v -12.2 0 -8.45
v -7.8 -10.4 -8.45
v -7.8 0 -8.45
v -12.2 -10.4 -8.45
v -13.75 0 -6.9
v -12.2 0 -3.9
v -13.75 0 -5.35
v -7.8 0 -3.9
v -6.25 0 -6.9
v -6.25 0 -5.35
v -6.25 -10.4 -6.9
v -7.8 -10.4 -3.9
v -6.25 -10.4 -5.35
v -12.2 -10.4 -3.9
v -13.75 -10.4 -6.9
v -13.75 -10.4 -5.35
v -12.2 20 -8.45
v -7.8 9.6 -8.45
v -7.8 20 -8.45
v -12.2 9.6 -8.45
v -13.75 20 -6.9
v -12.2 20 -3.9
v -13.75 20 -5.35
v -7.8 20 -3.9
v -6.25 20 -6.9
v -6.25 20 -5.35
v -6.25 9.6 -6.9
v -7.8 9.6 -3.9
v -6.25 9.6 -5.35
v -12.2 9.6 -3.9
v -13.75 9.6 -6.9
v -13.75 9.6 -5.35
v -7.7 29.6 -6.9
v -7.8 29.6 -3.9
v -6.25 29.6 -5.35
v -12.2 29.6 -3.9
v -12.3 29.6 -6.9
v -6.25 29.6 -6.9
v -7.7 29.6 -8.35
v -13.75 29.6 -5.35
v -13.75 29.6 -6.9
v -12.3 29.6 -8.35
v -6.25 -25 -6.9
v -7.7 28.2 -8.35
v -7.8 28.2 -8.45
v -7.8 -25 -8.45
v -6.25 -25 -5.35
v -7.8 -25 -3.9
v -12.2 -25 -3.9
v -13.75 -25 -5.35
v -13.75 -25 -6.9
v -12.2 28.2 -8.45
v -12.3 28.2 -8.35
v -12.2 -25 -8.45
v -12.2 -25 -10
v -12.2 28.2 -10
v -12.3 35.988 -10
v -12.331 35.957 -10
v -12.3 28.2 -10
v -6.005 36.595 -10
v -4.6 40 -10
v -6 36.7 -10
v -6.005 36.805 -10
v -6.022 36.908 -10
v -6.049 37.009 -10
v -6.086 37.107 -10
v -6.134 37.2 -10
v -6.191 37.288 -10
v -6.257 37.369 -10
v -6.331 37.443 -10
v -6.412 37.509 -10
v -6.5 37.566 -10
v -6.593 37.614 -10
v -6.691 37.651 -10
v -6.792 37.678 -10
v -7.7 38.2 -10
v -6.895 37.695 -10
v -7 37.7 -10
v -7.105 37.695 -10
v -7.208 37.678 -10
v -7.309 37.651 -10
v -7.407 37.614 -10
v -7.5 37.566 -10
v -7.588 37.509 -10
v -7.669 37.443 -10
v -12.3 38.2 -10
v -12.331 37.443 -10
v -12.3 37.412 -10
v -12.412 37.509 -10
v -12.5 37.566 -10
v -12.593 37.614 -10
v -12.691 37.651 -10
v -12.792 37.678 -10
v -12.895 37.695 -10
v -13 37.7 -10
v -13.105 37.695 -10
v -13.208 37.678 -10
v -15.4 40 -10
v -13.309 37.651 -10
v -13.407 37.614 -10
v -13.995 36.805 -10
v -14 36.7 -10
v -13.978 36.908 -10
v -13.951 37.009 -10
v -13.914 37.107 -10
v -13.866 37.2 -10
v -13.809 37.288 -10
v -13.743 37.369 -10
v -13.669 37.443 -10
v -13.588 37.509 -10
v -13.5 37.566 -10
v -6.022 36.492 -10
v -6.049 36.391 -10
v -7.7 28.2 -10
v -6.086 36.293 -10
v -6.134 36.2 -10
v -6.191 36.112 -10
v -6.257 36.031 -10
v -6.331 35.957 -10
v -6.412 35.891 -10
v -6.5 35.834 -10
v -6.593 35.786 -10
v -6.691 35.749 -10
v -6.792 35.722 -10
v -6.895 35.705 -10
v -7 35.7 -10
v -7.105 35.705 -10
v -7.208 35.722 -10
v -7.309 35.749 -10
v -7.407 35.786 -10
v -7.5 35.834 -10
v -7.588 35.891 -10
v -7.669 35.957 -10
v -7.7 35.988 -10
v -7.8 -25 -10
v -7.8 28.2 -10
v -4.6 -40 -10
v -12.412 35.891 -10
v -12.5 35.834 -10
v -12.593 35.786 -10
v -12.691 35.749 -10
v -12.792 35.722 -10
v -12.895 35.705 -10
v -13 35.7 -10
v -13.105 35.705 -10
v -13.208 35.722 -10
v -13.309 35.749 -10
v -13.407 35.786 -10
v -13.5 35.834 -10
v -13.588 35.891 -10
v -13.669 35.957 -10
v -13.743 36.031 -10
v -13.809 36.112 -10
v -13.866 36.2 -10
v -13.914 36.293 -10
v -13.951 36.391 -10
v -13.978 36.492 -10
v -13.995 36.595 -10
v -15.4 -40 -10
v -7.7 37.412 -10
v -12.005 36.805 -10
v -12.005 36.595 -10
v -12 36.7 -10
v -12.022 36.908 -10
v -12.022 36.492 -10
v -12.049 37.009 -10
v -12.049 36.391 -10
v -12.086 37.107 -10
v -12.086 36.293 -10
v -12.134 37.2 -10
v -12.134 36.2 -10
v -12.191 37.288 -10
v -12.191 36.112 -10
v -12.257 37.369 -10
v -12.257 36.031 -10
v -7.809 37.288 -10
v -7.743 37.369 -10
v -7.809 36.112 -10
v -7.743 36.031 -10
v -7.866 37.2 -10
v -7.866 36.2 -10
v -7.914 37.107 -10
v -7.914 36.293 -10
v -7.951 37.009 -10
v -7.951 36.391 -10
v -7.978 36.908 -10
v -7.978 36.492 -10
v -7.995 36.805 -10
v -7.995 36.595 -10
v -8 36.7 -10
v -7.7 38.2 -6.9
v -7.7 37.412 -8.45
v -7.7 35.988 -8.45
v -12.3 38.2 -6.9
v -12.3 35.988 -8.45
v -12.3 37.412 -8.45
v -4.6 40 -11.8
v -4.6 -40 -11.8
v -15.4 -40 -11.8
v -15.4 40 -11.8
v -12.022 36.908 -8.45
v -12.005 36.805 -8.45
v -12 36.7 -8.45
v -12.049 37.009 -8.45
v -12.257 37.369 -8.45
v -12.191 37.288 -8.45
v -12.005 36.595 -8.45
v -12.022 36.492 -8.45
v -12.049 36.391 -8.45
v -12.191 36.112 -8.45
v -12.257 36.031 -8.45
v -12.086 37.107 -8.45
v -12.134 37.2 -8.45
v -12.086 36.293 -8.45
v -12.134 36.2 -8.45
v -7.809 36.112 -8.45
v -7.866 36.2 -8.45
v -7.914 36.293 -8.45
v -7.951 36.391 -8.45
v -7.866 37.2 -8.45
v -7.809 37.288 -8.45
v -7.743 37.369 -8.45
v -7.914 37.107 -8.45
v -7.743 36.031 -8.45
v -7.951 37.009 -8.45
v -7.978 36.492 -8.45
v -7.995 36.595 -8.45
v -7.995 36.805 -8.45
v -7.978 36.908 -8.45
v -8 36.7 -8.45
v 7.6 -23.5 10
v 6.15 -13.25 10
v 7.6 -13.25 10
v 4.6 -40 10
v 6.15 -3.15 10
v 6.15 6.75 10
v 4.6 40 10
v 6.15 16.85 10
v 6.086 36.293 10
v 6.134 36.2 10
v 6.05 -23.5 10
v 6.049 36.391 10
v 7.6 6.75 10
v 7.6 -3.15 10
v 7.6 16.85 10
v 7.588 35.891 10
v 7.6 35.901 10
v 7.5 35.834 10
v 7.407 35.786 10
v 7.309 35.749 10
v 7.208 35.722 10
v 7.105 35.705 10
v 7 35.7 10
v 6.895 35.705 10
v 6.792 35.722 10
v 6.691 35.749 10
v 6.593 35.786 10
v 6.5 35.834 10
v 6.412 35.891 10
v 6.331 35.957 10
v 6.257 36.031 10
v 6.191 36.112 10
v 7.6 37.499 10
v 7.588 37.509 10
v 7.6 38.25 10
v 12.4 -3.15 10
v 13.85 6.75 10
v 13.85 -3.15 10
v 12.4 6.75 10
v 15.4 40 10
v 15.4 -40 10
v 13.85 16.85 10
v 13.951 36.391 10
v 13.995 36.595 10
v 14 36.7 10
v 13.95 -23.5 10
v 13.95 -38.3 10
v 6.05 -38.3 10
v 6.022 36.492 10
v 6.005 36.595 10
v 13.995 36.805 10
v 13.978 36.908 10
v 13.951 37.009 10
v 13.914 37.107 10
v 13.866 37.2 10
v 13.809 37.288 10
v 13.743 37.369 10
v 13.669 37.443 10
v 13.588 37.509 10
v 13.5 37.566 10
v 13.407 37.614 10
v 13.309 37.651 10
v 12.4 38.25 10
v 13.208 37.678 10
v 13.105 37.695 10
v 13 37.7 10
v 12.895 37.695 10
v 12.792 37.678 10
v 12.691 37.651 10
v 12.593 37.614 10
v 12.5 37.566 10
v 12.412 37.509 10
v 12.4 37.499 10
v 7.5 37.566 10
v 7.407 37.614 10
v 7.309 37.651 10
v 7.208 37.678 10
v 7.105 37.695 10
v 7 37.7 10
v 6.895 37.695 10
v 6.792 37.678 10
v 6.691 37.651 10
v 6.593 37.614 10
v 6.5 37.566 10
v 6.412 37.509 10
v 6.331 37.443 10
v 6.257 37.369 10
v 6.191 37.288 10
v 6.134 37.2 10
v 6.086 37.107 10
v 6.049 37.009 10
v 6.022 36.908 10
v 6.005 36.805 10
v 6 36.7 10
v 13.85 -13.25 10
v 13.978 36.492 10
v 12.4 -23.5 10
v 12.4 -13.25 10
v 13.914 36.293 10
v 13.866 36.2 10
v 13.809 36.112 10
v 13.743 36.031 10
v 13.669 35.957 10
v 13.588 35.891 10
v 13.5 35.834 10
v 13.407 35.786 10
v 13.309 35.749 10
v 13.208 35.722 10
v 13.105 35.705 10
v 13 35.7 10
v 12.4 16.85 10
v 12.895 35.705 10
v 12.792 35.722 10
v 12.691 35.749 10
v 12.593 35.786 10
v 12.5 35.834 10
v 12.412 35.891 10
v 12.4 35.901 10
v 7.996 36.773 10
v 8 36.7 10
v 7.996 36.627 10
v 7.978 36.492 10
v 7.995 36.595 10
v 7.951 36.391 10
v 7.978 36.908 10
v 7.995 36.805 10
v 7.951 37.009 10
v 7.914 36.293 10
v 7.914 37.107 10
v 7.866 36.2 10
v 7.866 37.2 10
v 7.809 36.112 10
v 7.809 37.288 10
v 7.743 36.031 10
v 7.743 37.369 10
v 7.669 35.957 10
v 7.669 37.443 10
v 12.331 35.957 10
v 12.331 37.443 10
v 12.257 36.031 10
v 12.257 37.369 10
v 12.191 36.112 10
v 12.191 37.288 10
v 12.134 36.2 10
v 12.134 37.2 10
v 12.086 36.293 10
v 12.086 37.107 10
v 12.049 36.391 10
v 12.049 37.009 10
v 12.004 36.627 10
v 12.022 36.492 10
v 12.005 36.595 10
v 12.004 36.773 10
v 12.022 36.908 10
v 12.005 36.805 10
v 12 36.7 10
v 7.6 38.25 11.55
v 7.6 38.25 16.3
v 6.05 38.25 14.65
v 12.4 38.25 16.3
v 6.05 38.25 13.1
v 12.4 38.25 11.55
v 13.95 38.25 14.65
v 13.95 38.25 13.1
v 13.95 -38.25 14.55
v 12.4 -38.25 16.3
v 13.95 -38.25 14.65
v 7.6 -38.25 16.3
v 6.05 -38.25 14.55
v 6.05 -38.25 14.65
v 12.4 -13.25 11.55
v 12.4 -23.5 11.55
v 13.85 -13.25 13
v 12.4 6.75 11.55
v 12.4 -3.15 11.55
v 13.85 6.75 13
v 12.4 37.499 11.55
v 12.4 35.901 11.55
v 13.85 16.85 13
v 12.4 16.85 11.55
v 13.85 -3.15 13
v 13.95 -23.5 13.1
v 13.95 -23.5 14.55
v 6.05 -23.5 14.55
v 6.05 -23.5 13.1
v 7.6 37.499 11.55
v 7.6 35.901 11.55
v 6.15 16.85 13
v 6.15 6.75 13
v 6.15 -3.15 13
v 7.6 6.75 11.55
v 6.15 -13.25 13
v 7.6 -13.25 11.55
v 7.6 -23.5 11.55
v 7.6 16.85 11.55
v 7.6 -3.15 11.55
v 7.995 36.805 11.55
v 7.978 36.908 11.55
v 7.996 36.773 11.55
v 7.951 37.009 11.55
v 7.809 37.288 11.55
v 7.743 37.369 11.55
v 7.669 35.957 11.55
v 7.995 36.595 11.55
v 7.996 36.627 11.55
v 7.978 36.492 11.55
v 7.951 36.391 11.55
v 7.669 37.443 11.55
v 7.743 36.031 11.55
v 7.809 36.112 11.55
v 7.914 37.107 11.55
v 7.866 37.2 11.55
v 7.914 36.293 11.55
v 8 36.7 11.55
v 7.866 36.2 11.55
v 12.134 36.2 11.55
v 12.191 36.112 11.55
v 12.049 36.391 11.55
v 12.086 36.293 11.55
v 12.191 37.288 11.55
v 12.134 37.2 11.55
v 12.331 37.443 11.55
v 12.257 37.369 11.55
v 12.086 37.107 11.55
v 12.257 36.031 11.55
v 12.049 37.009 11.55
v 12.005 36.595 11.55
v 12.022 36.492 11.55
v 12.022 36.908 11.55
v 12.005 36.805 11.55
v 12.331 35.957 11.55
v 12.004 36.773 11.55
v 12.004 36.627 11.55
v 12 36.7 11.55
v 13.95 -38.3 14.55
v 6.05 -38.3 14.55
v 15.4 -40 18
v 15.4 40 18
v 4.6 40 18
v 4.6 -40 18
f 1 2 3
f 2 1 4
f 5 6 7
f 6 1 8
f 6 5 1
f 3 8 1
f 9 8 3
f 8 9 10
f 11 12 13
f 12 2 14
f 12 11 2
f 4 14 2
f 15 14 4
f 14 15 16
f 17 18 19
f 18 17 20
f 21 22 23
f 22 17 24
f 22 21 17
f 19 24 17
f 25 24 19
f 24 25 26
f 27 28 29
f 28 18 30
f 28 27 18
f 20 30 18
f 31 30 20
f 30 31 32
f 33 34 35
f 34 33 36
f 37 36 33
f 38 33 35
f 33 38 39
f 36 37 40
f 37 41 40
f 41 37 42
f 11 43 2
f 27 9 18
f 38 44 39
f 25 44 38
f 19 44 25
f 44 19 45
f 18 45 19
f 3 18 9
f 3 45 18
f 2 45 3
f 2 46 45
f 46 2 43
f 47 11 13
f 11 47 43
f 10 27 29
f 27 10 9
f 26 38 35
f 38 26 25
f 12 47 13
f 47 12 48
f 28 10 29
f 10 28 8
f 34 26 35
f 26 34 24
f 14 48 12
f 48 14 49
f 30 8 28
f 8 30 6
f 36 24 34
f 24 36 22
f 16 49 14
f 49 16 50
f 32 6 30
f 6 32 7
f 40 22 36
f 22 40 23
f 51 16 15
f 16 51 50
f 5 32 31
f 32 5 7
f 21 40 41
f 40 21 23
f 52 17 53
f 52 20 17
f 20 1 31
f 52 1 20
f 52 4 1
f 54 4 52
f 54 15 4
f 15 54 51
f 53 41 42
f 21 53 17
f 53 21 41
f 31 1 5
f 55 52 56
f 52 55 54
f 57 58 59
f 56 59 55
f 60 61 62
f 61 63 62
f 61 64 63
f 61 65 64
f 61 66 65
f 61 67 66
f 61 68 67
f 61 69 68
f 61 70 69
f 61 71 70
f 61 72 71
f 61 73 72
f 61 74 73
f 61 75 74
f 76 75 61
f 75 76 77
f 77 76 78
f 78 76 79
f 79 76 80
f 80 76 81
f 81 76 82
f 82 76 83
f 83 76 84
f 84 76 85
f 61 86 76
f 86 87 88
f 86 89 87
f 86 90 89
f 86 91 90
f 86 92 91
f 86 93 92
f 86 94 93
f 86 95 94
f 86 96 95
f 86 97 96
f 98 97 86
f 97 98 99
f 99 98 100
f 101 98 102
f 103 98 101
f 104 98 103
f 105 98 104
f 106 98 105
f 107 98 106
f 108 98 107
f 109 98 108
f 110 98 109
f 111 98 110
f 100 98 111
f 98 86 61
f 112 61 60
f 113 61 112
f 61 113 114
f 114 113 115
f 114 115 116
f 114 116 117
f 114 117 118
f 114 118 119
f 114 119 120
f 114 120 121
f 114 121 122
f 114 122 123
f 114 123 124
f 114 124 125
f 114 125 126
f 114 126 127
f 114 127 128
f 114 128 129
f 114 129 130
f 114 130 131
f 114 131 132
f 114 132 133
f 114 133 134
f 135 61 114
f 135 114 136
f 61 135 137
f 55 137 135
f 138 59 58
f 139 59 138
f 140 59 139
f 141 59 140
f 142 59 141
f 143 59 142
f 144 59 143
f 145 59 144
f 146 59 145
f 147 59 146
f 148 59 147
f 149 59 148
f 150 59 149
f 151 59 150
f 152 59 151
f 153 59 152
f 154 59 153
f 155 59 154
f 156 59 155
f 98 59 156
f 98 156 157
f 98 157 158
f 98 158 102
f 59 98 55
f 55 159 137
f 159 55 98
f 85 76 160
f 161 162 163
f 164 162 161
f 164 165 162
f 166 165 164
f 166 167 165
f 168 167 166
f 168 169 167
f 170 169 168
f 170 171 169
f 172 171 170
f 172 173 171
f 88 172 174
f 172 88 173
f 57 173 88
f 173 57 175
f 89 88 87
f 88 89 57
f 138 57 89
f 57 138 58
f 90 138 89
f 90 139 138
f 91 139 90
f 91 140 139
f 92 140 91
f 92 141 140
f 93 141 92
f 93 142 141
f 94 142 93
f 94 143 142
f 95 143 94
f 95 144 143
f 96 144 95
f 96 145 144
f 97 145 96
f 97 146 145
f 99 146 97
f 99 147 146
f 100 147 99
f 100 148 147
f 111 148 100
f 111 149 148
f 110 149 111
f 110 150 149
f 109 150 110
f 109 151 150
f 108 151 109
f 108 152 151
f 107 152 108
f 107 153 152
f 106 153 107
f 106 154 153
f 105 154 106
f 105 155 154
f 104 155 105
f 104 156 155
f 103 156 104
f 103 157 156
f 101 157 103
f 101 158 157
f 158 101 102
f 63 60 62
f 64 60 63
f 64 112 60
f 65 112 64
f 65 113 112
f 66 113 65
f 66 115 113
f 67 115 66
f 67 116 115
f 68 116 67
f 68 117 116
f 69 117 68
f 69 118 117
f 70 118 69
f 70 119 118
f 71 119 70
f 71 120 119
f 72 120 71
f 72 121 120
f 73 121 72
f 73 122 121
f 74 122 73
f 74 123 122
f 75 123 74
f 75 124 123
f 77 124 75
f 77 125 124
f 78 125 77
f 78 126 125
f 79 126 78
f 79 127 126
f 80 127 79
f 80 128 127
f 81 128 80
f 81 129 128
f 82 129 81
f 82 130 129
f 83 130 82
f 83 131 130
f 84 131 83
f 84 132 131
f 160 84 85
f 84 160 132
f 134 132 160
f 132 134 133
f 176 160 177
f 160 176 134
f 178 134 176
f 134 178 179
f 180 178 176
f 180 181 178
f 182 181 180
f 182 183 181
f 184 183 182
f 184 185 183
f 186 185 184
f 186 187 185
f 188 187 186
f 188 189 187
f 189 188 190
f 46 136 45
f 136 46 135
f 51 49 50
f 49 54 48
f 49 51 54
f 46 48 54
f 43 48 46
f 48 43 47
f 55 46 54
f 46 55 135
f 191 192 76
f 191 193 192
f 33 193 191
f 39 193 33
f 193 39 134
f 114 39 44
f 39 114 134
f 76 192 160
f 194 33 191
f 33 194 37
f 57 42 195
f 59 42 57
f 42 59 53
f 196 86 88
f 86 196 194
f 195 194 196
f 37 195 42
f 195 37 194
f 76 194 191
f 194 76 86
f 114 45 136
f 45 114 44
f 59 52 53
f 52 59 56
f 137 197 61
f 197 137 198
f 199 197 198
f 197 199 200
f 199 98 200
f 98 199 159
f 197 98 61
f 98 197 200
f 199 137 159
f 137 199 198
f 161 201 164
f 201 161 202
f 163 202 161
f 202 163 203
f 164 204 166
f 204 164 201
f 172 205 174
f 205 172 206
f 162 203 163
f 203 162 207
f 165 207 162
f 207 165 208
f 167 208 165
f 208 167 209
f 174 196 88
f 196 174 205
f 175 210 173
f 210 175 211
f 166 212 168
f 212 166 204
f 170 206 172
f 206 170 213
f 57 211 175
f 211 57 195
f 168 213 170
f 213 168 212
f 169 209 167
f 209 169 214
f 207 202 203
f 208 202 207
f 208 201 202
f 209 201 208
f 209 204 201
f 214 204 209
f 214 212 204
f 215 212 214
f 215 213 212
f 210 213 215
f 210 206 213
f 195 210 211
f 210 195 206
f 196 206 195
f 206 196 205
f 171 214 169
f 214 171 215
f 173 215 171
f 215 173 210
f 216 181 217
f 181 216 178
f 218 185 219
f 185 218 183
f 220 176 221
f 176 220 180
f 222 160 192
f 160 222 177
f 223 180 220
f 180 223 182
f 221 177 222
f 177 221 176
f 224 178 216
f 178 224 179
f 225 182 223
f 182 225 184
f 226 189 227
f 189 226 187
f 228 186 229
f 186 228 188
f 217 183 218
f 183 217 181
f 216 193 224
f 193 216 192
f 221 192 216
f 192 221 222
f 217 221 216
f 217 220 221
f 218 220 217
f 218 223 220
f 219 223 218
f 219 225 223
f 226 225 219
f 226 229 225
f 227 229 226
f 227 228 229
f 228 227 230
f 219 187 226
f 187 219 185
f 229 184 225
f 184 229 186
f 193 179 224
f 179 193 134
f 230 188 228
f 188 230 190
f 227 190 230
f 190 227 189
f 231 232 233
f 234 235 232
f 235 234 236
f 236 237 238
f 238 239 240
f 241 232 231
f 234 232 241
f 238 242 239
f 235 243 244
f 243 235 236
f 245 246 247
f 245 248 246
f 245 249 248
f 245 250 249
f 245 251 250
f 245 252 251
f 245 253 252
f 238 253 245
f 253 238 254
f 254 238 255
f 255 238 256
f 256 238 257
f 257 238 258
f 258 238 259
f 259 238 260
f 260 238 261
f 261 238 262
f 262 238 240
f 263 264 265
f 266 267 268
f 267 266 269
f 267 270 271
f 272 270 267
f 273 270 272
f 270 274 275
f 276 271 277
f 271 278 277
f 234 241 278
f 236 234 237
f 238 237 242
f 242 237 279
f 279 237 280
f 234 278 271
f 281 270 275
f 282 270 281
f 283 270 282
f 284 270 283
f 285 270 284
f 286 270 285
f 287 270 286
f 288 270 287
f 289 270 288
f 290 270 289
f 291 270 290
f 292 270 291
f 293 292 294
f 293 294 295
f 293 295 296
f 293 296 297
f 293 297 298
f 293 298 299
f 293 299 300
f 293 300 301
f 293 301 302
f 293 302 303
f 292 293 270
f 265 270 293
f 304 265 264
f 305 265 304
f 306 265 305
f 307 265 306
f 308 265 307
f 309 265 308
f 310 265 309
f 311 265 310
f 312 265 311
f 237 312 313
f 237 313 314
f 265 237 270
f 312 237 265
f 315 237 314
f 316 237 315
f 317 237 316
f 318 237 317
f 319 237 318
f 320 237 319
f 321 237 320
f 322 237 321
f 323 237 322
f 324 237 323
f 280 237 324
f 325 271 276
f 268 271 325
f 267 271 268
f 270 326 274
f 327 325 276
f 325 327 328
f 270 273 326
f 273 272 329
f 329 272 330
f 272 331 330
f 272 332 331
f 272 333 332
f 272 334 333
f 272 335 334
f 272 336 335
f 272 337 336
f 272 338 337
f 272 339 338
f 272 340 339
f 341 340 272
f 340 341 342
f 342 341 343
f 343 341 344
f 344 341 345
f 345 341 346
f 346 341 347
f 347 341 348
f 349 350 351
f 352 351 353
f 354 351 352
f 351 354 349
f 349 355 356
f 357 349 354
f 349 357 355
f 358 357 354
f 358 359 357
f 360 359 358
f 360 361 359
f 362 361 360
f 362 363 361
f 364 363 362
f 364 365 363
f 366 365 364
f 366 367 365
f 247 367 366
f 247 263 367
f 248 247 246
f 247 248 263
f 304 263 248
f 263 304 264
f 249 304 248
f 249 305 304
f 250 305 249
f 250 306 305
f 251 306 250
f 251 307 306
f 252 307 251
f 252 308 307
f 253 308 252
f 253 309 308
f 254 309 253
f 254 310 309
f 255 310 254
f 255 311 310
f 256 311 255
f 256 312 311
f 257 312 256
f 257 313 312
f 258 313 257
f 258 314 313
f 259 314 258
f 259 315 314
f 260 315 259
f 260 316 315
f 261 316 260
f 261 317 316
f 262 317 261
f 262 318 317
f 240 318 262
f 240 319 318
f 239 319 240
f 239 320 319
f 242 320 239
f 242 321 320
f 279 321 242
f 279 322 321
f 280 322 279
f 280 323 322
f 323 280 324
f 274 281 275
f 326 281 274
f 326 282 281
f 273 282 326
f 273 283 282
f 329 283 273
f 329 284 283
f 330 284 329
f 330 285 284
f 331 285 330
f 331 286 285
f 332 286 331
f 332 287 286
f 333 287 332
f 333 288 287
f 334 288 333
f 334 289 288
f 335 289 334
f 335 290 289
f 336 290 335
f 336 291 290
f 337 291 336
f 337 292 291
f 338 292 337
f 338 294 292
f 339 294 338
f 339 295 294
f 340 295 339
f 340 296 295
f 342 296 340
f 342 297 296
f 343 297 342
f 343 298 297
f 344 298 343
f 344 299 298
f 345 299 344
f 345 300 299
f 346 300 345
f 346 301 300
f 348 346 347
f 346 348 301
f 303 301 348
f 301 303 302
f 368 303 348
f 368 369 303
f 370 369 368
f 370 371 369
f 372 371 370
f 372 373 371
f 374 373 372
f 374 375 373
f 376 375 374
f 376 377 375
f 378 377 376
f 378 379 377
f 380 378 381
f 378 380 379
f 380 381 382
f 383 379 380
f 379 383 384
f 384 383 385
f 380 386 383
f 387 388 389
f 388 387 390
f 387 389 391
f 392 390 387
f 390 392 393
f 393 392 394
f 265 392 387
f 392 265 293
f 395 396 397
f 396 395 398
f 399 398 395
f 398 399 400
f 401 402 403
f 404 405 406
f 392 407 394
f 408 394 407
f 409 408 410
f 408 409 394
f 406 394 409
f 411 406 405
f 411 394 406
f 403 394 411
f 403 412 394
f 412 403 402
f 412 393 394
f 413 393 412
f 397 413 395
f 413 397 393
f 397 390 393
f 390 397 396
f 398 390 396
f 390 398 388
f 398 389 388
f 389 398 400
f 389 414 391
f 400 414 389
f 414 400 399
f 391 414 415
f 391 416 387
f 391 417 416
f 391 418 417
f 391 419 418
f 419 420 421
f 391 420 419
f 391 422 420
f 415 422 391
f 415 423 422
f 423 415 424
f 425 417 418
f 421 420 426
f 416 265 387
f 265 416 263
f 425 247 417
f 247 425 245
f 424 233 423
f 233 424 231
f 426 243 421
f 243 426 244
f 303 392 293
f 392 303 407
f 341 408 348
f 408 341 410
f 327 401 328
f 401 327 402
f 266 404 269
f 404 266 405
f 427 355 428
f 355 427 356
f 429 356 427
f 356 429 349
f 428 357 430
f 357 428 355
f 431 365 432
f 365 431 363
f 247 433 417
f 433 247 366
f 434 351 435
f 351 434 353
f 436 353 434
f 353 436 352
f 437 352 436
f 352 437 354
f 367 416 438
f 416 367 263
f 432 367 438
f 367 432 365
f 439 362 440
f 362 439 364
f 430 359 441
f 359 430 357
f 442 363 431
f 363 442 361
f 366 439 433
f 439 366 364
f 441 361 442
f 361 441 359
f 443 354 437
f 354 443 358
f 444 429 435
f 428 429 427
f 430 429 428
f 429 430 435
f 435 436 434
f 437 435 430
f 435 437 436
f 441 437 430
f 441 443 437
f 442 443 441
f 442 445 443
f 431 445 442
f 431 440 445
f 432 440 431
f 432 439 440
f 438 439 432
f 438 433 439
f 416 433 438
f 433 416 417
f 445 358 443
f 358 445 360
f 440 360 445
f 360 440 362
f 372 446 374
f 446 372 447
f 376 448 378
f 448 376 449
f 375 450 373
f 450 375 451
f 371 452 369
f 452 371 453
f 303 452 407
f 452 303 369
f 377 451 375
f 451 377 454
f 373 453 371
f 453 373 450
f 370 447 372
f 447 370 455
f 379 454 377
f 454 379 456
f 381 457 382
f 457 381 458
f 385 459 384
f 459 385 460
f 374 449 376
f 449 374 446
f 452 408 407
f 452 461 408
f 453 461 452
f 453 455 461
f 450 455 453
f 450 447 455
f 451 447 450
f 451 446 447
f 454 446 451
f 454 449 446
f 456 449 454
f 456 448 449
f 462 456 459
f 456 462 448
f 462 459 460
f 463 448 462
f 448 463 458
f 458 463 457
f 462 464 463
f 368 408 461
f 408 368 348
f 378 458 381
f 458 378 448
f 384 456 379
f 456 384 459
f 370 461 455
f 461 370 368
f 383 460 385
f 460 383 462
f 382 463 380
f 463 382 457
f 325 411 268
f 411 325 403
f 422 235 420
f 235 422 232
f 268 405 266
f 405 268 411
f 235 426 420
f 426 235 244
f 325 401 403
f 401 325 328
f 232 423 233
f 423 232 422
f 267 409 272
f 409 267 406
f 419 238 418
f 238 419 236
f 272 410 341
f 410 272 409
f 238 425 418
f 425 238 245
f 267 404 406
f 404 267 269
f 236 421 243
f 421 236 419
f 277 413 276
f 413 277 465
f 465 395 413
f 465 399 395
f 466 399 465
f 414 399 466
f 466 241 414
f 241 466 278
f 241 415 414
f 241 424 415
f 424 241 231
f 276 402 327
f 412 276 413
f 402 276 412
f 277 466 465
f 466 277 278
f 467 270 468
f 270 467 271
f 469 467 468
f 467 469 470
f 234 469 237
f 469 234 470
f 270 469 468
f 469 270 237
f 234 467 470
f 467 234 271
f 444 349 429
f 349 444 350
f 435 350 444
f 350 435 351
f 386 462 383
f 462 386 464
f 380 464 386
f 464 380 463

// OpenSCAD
Length=80;
Width=10;
Height=8;
basethickness=1.8;

module RailProfile(g=1.2,l=20,bt=2,topw=5,h=0,
               brickl=10,top=false,w=0,
               pspace=-0.1,
               brick=true,
               spacer=false)
{
   topw=w>0 ? (w-(2*bt)-(3-g)) : topw;
   g=h>0 ? (h-bt)/4 : g;
   echo("Grid=",g);
   toothcount=floor((l-2*bt-brickl*1.5-brickl)/brickl/2);
   if (top){
      union(){
         difference(){
            translate([(topw+4*g)/2*-1,l/2*-1,0]) 
              cube([topw+4*g,l,4*g+bt]);
            if (!spacer){
               RailProfile(g=g,l=l,bt=bt,topw=topw,brickl=brickl,
                           top=false,pspace=pspace*-1,
                           brick=false);
               sbricklen=brickl*1.5+2*pspace;
               translate([0,(l/2)*-1+sbricklen/2+bt+pspace,
                          (3*g+pspace)/2]) 
                  cube([topw+2*g+pspace*2*-1,
                        sbricklen,
                        3*g+pspace],
                       center=true);
               for(i=[0:toothcount-1]){
                  translate(
                     [0,
                      (((l/2)*-1)+bt+((brickl)/2)+brickl*1.5+brickl)+
                       i*(brickl*2),
                      (2*g)/2]) 
                     cube([topw+2*g,(brickl+pspace*-1),2*g],center=true);
               }
            }
         }
         if (!spacer){
            translate([(topw/2+0.4)*-1,l/2-bt-1.5,g/2])
               cylinder(r=0.7,h=g,$fn=60,center=true);
            translate([(topw/2+0.4),l/2-bt-1.5,g/2])
               cylinder(r=0.7,h=g,$fn=60,center=true);
         }
      }
   }
   else{
      difference(){
         union(){
            translate([0,0,bt/2*-1]) cube([topw+4*g,l,bt],center=true);
            if (spacer){
               translate([0,0,(4*g+pspace)/2]) 
                  cube([topw+4*g,l,4*g+pspace],center=true);
            }
            if (!spacer){
               difference(){
                  rotate(90,[1,0,0]){
                     linear_extrude(l+pspace-2*bt,center=true) 
                     union(){
                        polygon([
                            [0,0],
                            [(topw/2+pspace),0],
                            [(topw/2+pspace),1*g],
                            [(1*g+topw/2+pspace),2*g],
                            [(1*g+topw/2+pspace),3*g],
                            [(topw/2+pspace),4*g+pspace],
                            [(topw/2+pspace)*-1,4*g+pspace],
                            [(1*g+topw/2+pspace)*-1,3*g],
                            [(1*g+topw/2+pspace)*-1,2*g],
                            [(topw/2+pspace)*-1,1*g],
                            [(topw/2+pspace)*-1,0],
                           ],
                           [[0,1,2,3,4,5,6,7,8,9,10,0]]
                        );
                     }
                  };
                  if (brick){
                     bricklen=brickl*1.5+abs(pspace);
                     translate([0,(l/2*-1)+(bricklen/2)+pspace,(4*g+pspace)/2]) 
                        cube([ topw+4*g,bricklen,4*g+pspace],center=true);
                  }
                  if (brick){
                     for(i=[0:toothcount]){
                        translate(
                           [0,
                            (((l/2)*-1)+bt+brickl*1.5+brickl/2+brickl*1.3)+
                             i*(brickl*2),
                            (4*g+pspace)/2+g]) 
                           cube([topw+2*g,
                                 brickl+2*(2*pspace*-1),
                                 4*g+pspace],center=true);
                     }
                  }
               }
               if (brick){
                  translate([topw/2*-1,(l/2)-brickl-bt,0]) 
                     cube([topw,brickl,g*2]);
               }
        
            }
         }
         translate([(topw/2+0.7)*-1,l/2-bt-1.5,g/2])
            cylinder(r=1.0,h=g,$fn=60,center=true);
         translate([(topw/2+0.7),l/2-bt-1.5,g/2])
            cylinder(r=1.0,h=g,$fn=60,center=true);
      }
   }
}


//translate([-30,0,-30]) 
//   color("red") 
//   RailProfile(h=Height,l=Length,w=Width,bt=basethickness,top=false,
//               spacer=true);

translate([-10,0,-10]) 
   color("green") 
   RailProfile(h=Height,l=Length,w=Width,bt=basethickness,top=false);

translate([10,0,10]) 
   color("blue") 
   RailProfile(h=Height,l=Length,w=Width,bt=basethickness,top=true);

//translate([30,0,30]) 
//   color("red") 
//   RailProfile(h=Height,l=Length,w=Width,bt=basethickness,top=true,
//               spacer=true);
